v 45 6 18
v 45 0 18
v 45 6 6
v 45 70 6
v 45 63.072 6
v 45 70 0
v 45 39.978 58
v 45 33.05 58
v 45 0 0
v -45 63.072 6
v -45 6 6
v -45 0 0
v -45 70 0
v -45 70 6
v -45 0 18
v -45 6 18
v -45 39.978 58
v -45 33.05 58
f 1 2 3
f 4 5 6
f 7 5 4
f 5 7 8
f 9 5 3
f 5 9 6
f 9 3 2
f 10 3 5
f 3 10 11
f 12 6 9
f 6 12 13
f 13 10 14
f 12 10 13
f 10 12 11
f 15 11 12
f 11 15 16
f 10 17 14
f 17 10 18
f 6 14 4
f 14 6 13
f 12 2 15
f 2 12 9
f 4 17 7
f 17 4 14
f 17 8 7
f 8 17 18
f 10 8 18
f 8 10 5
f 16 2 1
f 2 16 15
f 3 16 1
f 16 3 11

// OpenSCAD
stand_width = 90; base_depth = 70; base_thickness = 6;
lean_angle = 60; backrest_thickness = 6; backrest_top_z = 58;
lip_height = 12; lip_thickness = 6;
rise = backrest_top_z - base_thickness;
run = rise / tan(lean_angle);
shift = backrest_thickness / sin(lean_angle); // horizontal offset of the front face
// YZ profile, extruded along X: 2D x -> Y, 2D y -> Z
module yz(pts) translate([-stand_width/2, 0, 0]) rotate([90, 0, 90]) linear_extrude(stand_width) polygon(pts);
union() {
  translate([-stand_width/2, 0, 0]) cube([stand_width, base_depth, base_thickness]);
  yz([[base_depth, base_thickness - 1], [base_depth, base_thickness],
      [base_depth - run, backrest_top_z], [base_depth - run - shift, backrest_top_z],
      [base_depth - shift, base_thickness], [base_depth - shift, base_thickness - 1]]);
  translate([-stand_width/2, 0, base_thickness - 1]) cube([stand_width, lip_thickness, lip_height + 1]);
}
